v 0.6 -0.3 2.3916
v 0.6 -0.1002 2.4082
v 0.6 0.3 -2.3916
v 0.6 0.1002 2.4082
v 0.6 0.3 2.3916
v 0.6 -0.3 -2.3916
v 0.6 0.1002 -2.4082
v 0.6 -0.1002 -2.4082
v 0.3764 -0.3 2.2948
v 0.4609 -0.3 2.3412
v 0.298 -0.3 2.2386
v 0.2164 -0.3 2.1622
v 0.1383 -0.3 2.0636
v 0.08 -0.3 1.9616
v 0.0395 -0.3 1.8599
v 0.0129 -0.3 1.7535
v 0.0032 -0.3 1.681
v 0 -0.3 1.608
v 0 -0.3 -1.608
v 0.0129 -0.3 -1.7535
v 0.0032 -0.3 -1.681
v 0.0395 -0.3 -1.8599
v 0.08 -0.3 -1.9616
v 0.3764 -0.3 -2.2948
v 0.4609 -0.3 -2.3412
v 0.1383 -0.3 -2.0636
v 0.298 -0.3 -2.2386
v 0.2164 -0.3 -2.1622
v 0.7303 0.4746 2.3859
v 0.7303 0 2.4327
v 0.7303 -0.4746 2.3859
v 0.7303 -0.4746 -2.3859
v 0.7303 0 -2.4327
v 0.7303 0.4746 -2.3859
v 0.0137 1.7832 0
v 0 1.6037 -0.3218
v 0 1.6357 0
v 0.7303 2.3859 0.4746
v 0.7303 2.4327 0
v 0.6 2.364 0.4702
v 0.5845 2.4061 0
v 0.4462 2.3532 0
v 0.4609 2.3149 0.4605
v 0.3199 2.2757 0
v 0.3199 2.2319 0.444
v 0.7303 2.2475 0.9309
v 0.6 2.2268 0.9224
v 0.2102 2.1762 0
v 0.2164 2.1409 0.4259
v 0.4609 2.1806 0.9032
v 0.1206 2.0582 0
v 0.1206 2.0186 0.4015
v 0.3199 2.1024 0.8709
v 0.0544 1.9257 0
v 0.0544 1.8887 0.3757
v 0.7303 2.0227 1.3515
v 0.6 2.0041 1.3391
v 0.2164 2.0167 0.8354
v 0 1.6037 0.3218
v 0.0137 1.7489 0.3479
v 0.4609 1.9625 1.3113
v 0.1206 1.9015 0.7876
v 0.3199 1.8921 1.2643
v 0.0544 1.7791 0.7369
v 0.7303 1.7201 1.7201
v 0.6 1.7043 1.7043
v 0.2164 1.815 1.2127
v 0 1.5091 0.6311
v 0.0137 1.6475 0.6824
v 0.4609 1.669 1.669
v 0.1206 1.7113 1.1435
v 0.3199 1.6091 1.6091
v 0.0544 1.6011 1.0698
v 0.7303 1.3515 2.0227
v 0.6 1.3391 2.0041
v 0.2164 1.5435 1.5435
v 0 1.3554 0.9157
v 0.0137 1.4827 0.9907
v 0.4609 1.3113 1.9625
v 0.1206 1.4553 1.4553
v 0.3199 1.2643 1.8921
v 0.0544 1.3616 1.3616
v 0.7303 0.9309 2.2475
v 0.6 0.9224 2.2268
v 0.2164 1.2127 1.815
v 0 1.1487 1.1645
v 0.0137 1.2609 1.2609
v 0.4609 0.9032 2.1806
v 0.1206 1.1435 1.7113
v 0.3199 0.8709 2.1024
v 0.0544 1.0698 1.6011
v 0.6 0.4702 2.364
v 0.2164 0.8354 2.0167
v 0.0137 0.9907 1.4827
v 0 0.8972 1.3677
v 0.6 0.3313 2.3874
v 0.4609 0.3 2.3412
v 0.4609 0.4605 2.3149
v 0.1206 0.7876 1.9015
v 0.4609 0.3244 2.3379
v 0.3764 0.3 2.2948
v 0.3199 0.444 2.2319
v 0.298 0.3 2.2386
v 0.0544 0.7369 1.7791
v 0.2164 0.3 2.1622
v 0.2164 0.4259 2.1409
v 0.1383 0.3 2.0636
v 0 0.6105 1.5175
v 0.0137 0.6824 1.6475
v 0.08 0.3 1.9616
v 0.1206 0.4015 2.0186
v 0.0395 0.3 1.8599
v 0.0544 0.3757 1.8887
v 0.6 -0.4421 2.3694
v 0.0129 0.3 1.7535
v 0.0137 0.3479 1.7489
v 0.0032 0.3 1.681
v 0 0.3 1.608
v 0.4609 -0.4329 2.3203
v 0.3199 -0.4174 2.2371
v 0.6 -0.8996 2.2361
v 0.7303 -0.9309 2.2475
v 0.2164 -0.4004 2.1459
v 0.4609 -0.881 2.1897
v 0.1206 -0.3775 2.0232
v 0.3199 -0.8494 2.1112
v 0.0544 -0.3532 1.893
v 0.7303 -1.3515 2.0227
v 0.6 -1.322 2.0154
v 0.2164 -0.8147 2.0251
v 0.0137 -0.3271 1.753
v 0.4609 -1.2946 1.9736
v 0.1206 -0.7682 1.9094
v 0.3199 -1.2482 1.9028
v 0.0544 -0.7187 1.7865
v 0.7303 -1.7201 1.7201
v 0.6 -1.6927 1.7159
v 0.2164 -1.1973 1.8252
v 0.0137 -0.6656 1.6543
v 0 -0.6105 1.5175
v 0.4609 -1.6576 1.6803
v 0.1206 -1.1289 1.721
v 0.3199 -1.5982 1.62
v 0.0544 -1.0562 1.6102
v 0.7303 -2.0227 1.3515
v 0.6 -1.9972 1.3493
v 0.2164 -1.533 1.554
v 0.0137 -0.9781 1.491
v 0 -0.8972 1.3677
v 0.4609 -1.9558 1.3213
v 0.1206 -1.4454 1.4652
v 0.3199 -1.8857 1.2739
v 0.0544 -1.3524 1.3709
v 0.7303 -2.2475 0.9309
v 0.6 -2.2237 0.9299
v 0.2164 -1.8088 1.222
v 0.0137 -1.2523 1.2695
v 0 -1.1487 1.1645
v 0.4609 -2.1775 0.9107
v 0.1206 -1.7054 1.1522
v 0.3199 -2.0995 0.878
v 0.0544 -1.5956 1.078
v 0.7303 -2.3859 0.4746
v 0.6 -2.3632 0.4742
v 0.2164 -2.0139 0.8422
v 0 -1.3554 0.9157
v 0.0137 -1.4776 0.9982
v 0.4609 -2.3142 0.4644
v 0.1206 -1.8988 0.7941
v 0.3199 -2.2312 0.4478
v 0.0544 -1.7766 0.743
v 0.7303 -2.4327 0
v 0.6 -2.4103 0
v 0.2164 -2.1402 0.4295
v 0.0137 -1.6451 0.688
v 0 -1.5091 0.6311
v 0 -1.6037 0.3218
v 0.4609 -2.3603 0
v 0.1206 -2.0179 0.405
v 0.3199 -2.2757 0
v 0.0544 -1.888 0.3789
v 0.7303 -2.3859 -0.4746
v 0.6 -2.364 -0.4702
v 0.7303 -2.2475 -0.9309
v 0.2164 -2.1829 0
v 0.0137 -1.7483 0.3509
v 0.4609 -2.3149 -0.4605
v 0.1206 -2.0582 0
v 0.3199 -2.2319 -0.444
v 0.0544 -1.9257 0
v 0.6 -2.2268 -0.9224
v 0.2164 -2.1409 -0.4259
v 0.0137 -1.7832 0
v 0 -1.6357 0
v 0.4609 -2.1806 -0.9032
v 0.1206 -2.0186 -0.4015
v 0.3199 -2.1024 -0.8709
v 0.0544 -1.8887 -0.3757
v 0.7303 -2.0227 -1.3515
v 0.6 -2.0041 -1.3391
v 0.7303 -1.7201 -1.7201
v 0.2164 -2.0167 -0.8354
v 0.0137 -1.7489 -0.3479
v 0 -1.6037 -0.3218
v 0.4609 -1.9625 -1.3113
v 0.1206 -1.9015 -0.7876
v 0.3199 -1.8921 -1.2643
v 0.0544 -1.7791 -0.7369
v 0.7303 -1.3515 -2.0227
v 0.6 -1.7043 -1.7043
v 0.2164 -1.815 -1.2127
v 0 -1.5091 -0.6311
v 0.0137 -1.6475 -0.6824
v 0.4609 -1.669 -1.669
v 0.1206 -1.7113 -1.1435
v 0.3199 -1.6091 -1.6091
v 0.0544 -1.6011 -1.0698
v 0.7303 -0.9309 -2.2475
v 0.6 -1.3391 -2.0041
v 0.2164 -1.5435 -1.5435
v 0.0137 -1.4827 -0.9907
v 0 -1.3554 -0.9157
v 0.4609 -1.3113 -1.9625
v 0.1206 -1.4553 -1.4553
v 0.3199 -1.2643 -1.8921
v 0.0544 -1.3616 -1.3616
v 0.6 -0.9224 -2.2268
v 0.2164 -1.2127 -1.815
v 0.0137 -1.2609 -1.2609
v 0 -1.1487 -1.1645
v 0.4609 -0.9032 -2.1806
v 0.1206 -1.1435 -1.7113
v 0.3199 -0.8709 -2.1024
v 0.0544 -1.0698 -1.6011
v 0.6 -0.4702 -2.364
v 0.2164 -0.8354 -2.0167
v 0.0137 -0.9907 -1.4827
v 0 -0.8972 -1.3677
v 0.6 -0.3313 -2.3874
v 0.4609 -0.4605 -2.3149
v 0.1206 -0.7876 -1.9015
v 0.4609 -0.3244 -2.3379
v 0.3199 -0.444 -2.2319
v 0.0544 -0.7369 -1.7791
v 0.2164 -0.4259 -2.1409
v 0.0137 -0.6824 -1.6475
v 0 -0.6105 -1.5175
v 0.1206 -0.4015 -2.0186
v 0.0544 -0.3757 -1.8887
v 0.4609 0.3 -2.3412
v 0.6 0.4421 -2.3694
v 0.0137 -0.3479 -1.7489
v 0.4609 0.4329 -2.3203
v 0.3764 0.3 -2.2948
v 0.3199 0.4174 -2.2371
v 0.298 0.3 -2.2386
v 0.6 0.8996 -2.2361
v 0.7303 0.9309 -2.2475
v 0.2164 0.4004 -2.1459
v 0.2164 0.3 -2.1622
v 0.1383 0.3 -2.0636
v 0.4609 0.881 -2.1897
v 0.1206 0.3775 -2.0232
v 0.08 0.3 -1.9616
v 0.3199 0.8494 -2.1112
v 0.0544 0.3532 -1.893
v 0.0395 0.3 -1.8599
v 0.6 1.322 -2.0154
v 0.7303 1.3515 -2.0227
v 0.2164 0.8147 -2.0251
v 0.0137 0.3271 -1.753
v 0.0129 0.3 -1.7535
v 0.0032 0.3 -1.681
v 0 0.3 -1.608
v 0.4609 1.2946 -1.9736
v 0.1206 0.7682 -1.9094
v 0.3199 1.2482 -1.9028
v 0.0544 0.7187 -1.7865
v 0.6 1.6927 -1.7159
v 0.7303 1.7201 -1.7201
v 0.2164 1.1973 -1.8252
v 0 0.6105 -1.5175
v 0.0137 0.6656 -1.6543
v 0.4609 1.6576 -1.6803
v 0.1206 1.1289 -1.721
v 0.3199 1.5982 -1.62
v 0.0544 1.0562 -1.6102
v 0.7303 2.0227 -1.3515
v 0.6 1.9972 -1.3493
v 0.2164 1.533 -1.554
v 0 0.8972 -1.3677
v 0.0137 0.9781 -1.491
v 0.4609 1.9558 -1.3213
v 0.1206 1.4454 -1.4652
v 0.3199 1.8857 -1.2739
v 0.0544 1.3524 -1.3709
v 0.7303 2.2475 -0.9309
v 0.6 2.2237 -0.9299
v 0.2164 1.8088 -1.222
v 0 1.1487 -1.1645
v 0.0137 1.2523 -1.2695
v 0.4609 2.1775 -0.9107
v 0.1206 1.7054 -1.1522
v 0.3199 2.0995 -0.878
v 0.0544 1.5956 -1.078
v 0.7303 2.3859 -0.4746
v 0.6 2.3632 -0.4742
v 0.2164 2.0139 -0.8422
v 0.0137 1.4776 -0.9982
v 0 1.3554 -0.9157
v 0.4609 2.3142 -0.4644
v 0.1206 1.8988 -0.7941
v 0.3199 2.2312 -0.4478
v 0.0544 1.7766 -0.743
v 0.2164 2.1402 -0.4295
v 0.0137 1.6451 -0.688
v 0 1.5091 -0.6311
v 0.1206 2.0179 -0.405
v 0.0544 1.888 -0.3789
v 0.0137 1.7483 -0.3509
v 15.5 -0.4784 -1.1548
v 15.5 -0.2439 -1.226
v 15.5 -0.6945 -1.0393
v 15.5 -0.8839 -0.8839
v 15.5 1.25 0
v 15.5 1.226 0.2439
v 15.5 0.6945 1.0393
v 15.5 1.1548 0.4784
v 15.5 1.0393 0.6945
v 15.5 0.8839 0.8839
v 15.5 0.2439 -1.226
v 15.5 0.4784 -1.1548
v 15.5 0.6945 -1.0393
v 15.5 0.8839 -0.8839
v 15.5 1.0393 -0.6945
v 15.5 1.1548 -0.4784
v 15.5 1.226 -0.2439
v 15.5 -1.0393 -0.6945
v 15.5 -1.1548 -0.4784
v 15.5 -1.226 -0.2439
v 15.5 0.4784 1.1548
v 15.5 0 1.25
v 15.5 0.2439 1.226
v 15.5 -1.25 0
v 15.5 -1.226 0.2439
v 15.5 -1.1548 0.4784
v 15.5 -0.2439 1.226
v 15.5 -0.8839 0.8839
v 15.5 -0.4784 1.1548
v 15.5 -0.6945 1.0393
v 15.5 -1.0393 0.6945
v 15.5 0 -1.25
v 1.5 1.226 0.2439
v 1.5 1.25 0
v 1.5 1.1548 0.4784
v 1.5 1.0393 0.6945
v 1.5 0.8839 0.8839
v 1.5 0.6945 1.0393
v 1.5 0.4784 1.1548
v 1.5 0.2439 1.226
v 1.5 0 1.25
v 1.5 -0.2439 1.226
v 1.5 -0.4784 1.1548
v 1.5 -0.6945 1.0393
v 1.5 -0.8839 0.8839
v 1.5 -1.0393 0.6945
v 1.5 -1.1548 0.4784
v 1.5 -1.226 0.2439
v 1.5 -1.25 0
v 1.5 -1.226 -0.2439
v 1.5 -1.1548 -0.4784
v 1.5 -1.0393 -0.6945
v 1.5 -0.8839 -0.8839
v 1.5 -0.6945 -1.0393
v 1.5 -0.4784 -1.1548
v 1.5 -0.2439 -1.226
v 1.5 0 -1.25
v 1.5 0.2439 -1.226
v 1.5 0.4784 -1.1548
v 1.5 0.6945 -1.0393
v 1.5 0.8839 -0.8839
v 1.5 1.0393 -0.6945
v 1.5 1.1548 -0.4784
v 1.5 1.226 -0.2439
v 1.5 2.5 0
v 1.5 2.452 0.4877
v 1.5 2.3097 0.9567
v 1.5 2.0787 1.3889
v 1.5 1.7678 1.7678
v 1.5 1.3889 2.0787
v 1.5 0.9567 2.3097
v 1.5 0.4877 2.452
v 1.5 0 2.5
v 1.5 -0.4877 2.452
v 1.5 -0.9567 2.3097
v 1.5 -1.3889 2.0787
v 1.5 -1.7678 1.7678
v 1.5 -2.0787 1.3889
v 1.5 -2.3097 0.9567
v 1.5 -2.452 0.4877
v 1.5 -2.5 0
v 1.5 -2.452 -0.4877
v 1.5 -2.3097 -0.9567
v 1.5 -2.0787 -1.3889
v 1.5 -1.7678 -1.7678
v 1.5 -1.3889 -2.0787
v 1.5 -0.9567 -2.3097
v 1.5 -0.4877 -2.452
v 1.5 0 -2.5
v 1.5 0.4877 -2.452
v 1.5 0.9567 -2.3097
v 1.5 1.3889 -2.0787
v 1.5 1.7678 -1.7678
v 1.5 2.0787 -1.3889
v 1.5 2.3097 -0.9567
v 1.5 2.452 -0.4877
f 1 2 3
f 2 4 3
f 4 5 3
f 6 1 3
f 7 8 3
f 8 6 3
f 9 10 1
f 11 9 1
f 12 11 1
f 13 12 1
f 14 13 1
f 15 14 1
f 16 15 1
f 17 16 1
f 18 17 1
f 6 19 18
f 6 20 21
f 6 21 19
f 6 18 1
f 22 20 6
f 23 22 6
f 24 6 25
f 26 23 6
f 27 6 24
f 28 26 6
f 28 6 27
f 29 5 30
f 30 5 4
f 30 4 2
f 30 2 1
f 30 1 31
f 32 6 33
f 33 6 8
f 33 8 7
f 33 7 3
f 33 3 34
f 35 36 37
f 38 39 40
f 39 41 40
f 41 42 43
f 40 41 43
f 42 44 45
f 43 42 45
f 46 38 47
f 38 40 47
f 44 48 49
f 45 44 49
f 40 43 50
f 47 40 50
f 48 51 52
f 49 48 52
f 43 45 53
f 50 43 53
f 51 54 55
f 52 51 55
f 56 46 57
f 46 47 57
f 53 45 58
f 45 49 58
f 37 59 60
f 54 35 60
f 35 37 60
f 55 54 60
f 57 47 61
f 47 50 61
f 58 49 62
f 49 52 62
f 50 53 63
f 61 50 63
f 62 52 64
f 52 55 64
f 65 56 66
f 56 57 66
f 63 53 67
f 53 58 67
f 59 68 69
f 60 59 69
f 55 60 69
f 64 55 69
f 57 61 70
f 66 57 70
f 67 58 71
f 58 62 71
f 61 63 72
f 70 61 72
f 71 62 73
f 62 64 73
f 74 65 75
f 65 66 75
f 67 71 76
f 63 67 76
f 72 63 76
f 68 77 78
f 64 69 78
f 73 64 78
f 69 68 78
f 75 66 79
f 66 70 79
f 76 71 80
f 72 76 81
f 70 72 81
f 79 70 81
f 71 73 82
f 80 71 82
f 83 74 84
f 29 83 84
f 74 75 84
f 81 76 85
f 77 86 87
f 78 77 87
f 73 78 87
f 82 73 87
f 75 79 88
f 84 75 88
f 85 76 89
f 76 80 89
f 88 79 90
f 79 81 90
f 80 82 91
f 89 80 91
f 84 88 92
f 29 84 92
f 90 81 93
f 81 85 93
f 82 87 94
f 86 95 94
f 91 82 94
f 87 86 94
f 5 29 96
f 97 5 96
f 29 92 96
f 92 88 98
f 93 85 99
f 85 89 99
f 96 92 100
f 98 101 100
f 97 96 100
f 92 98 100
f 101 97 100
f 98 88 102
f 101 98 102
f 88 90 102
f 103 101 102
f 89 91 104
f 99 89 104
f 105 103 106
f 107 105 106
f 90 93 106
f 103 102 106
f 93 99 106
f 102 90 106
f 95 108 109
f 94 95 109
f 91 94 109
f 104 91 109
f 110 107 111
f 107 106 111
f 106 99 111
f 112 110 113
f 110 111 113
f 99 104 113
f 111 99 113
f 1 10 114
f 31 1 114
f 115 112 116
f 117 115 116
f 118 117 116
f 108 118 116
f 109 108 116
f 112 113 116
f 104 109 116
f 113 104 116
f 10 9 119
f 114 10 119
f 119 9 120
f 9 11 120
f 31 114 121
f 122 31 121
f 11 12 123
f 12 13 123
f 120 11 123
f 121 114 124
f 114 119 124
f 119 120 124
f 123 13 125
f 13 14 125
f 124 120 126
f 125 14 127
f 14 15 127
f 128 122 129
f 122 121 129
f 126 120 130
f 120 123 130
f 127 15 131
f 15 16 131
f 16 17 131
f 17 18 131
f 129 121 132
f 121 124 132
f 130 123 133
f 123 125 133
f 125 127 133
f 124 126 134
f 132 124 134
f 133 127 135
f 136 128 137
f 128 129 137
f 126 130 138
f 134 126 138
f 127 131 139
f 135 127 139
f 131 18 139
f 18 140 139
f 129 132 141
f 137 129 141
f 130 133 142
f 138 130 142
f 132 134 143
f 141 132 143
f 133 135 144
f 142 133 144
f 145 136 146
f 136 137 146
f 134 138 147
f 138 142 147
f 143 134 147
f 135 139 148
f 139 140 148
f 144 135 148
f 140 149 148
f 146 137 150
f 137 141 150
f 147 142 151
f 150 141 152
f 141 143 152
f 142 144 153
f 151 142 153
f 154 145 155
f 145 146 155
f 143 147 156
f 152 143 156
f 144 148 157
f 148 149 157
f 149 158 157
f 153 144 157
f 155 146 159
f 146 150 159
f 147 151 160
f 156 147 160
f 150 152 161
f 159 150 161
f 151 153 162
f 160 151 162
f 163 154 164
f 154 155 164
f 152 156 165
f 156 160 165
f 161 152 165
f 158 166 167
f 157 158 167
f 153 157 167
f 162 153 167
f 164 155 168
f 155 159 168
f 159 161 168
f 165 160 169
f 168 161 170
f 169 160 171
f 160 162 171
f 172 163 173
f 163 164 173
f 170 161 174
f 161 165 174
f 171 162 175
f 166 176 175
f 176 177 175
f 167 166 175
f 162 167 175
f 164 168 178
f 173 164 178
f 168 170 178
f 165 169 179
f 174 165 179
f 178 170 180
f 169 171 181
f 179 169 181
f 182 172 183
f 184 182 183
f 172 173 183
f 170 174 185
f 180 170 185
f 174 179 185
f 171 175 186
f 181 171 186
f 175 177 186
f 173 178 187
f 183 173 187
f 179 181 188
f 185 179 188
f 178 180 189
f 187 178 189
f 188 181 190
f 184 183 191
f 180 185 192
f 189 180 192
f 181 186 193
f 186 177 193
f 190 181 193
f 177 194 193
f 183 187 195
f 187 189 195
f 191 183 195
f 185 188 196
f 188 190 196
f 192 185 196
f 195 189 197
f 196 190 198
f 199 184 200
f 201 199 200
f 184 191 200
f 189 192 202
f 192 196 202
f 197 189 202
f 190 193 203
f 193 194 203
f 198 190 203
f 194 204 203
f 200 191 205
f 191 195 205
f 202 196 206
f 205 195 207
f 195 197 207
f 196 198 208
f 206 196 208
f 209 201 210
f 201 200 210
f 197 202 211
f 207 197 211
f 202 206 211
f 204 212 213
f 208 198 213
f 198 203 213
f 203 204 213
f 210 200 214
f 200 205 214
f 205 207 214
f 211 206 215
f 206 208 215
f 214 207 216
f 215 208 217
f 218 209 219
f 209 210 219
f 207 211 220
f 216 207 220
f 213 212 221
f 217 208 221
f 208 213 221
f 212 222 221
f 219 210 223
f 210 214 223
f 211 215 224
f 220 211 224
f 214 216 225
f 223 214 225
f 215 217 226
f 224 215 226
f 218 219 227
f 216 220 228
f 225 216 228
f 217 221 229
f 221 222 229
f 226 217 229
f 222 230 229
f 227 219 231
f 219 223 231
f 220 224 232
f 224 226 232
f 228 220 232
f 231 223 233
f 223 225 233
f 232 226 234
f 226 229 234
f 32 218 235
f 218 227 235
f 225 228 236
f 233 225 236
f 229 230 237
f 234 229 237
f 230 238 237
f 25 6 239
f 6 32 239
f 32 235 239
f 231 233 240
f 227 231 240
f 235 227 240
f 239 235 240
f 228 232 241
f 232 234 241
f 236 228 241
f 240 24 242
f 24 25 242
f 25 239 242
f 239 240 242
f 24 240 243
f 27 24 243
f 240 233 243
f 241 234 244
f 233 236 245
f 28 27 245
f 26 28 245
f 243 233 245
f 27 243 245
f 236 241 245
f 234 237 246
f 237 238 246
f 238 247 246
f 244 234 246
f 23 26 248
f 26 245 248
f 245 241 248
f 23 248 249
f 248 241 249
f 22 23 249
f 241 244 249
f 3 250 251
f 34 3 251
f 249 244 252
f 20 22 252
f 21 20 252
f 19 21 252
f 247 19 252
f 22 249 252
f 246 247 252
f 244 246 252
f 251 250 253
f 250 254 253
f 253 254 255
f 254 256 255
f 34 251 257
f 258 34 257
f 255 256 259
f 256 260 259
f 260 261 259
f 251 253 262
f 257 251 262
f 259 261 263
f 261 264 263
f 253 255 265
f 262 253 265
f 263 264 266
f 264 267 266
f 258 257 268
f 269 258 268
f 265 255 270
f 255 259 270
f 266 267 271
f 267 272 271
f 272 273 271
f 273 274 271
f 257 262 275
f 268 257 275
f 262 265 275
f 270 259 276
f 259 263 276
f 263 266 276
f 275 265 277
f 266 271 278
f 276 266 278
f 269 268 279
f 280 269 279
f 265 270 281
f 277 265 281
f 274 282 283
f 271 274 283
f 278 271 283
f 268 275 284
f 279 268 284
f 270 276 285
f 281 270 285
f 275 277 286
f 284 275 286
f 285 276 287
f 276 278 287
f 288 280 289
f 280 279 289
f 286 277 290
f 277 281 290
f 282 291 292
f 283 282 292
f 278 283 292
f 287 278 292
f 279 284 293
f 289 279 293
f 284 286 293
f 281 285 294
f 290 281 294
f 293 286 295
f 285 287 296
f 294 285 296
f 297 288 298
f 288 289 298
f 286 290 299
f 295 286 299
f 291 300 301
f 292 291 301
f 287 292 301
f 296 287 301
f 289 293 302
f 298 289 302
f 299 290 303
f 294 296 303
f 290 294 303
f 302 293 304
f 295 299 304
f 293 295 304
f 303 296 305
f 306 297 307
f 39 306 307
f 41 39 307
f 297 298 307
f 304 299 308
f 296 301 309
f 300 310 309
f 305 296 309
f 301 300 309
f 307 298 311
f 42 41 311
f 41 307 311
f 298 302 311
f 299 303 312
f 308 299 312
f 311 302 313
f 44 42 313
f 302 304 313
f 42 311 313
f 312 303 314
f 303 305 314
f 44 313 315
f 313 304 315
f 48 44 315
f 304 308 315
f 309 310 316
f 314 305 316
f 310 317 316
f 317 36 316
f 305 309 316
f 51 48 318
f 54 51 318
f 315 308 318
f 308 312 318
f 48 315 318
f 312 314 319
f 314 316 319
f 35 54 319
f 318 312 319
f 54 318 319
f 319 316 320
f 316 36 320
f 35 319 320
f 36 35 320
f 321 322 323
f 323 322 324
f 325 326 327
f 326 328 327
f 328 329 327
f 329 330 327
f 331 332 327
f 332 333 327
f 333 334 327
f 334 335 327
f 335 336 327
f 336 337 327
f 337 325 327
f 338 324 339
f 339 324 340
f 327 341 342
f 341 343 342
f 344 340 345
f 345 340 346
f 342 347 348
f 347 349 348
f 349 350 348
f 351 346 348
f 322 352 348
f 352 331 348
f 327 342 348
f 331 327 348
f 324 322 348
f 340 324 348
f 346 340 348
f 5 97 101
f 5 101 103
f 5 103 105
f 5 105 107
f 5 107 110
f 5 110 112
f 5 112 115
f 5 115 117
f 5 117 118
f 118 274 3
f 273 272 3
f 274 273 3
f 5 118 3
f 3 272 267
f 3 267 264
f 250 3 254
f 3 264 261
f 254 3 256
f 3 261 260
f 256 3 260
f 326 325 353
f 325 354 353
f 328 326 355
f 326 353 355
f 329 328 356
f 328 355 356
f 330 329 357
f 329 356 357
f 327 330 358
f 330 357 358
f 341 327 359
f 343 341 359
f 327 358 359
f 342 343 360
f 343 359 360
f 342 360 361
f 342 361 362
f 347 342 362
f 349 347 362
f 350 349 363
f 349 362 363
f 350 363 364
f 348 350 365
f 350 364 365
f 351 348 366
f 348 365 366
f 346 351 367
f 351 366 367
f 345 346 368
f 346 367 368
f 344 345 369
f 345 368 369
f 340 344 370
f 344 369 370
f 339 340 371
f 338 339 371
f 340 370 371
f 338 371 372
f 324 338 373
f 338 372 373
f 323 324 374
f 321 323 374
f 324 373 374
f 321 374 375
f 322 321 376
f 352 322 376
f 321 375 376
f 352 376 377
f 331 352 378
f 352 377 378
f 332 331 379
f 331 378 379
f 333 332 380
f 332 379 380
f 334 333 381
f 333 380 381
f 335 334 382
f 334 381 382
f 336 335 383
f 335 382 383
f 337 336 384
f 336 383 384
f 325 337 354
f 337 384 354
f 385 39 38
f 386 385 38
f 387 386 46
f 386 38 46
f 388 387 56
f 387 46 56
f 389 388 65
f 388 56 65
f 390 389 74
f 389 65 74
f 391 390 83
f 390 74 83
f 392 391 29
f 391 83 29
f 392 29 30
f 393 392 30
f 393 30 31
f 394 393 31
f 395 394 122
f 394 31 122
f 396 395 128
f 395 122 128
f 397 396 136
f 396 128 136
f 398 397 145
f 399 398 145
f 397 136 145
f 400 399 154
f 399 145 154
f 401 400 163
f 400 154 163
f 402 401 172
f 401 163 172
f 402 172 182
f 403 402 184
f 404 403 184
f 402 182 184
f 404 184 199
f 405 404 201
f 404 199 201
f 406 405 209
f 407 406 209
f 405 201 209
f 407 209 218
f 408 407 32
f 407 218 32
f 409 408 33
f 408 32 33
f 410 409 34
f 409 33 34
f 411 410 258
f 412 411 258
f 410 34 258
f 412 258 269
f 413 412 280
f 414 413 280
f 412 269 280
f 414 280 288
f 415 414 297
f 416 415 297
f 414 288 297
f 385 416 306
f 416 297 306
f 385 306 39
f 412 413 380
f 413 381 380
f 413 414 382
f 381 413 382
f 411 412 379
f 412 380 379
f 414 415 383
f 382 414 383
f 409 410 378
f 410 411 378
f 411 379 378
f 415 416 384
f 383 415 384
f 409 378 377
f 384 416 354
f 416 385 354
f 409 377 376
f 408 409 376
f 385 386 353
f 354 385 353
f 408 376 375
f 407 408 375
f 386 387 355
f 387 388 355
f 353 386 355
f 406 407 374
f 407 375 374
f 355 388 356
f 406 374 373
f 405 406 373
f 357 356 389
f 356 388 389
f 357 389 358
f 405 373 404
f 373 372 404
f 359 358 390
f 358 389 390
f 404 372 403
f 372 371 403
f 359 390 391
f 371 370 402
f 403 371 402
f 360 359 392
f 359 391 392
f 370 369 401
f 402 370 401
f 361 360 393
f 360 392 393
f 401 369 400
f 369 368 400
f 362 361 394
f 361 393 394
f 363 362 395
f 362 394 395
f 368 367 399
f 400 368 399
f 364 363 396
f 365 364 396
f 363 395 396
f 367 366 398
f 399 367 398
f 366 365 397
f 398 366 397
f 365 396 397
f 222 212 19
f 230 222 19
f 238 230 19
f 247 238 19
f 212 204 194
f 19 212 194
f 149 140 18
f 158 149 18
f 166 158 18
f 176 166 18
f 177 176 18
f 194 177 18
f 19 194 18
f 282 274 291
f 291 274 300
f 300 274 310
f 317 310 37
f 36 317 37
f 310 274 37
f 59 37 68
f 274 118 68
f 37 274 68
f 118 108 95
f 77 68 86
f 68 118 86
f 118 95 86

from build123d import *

# Parameters (mm, degrees)
FILLET2_R  = 0.8
SKETCH2_W  = 5
SKETCH2_H  = 0.6
SLOT_DEPTH = 0.6


with BuildPart() as part:
    # BodySke → Base-Revolve (revolve)
    with BuildSketch(Plane.XY):
        Polygon((1.5, 1.25), (1.5, 2.5), (0, 2.368767005), (0, 0), (15.5, 0), (15.5, 1.25), align=None)
    revolve(axis=Axis((-25.4, 0, 0), (1, 0, 0)))

    # Fillet2
    fillet2_edges = [part.edges().sort_by_distance(p)[0] for p in [
        (0, -2.368767005, 0),
    ]]
    fillet(fillet2_edges, radius=FILLET2_R)

    # Sketch2 → Slot (cut)
    with BuildSketch(Plane(origin=(0, 0, 0), x_dir=(0, 0, -1), z_dir=(1, 0, 0))):
        Rectangle(SKETCH2_W, SKETCH2_H)
    extrude(amount=SLOT_DEPTH, mode=Mode.SUBTRACT)


solid = part.part
